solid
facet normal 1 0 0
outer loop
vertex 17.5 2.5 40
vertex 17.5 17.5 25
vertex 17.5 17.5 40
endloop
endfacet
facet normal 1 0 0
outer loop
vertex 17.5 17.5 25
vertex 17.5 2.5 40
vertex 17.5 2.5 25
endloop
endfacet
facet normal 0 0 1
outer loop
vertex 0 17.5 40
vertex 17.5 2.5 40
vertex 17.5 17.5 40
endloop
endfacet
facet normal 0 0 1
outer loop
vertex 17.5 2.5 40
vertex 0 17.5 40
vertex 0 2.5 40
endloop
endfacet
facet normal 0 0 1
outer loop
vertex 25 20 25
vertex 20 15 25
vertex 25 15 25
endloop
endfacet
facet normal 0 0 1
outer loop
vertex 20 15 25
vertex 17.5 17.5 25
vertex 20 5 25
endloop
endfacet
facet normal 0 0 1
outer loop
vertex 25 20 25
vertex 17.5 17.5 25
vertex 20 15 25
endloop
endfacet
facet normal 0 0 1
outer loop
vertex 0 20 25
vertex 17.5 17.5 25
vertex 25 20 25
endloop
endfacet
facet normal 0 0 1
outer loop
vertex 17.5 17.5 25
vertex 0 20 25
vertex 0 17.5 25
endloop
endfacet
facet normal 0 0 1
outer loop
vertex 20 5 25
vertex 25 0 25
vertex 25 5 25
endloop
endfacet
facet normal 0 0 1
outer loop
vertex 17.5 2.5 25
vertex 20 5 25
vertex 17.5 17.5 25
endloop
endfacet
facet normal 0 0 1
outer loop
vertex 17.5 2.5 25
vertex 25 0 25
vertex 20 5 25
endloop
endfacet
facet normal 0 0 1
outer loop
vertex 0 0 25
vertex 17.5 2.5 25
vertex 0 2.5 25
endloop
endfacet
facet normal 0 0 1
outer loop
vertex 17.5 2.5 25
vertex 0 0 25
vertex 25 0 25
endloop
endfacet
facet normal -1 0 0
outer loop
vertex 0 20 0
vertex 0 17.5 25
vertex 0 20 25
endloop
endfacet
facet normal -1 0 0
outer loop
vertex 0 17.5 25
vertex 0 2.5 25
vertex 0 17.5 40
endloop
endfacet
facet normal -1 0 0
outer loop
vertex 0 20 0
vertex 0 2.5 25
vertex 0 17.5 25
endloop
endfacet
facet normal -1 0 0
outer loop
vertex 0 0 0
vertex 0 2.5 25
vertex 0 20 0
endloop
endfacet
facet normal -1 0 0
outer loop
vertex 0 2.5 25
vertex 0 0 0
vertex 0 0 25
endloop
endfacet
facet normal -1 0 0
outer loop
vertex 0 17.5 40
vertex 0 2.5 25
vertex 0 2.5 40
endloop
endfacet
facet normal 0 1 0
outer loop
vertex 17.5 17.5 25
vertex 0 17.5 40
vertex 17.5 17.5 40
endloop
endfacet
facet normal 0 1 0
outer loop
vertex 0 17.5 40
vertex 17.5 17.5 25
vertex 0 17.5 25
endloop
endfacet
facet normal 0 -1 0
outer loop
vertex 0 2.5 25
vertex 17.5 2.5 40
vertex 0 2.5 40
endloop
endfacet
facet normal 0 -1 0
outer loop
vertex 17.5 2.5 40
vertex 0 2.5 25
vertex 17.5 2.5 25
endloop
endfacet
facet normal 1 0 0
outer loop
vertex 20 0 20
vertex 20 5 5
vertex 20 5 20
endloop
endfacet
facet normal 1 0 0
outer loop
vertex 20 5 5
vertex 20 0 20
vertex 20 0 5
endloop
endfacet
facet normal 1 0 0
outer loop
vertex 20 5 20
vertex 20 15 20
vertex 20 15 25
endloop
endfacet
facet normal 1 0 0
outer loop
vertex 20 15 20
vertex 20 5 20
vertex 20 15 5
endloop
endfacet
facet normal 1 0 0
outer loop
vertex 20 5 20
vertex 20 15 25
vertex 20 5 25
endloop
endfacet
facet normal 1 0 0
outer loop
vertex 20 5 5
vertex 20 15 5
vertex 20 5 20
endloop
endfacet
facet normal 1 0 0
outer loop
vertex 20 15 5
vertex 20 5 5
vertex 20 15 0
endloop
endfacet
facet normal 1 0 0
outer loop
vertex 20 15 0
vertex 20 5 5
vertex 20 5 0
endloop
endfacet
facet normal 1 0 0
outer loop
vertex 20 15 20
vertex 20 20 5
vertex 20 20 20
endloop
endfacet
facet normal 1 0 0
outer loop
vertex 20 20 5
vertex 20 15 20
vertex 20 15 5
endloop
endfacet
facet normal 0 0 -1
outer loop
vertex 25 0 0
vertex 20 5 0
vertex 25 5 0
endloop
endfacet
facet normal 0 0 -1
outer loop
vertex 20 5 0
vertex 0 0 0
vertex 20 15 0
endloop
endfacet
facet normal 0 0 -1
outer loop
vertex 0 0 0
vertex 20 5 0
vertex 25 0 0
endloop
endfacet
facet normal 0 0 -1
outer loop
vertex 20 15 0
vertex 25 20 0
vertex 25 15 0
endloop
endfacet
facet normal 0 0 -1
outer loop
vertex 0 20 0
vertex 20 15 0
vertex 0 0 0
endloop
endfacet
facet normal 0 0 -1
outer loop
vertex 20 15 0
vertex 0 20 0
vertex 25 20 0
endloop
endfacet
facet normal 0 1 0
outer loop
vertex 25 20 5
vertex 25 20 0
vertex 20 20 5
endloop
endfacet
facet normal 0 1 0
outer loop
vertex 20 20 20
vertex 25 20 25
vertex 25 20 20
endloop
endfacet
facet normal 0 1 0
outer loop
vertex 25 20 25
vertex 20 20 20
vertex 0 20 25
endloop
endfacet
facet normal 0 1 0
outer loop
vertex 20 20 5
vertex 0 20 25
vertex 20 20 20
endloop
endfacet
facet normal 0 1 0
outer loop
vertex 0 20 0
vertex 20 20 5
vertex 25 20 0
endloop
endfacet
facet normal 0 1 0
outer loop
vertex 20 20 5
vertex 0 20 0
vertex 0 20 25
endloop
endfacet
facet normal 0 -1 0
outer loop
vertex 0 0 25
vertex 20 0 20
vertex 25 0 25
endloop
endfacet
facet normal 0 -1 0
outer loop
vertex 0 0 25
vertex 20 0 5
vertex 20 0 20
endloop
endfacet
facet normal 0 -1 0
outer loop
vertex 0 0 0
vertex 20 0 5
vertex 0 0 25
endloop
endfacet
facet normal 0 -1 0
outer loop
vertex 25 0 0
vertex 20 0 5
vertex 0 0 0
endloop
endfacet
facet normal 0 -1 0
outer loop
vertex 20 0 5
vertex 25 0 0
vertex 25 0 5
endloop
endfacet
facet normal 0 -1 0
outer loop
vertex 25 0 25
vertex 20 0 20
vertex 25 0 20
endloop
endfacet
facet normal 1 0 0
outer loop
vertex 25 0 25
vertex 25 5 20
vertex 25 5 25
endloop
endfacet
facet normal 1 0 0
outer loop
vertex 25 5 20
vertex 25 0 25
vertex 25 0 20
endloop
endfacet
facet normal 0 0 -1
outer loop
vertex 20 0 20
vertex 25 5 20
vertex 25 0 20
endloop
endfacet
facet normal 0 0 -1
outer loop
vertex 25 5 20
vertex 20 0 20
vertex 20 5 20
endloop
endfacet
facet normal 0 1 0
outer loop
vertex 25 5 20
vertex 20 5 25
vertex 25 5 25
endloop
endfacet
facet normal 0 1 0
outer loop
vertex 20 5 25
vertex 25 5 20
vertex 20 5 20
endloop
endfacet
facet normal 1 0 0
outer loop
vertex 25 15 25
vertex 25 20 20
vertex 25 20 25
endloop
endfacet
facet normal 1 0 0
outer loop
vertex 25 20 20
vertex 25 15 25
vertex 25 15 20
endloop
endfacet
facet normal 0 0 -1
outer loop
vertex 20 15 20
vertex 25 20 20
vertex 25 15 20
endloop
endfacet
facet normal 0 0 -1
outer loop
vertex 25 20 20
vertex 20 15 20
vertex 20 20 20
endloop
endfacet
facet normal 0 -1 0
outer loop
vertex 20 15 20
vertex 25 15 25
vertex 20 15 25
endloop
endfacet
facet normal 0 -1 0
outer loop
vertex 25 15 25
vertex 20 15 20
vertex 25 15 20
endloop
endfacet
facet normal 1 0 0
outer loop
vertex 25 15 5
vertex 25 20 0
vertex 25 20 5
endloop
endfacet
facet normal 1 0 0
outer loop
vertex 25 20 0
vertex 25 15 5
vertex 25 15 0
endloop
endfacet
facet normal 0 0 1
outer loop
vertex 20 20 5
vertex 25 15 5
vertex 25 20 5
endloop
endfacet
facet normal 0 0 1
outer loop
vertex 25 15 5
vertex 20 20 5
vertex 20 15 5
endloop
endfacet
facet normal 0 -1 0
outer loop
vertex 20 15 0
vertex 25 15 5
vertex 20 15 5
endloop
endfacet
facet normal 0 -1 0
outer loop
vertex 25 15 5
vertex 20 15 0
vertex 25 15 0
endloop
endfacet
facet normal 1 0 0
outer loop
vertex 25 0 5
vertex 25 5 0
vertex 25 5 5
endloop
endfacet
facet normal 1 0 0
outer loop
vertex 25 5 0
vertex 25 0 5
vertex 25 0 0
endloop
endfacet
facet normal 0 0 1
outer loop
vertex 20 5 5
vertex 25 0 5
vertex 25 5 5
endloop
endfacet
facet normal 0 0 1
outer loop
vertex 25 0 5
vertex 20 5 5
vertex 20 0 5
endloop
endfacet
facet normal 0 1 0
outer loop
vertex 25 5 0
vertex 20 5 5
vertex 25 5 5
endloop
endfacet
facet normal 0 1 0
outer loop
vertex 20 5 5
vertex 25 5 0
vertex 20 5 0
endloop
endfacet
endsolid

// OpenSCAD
translate([0,2.5,25]) {
cube([17.5,15,15],center=false);
}


//Main Body
cube([20,20,25],center=false);

//left arm
translate([20,0,20]) {
    cube([5,5,5],center=false);
}

//right arm
translate([20,15,20]) {
    cube([5,5,5],center=false);
}

//right leg
translate([20,15,0]) {
    cube([5,5,5],center=false);
}

//left leg
translate([20,0,0]) {
    cube([5,5,5],center=false);
}
